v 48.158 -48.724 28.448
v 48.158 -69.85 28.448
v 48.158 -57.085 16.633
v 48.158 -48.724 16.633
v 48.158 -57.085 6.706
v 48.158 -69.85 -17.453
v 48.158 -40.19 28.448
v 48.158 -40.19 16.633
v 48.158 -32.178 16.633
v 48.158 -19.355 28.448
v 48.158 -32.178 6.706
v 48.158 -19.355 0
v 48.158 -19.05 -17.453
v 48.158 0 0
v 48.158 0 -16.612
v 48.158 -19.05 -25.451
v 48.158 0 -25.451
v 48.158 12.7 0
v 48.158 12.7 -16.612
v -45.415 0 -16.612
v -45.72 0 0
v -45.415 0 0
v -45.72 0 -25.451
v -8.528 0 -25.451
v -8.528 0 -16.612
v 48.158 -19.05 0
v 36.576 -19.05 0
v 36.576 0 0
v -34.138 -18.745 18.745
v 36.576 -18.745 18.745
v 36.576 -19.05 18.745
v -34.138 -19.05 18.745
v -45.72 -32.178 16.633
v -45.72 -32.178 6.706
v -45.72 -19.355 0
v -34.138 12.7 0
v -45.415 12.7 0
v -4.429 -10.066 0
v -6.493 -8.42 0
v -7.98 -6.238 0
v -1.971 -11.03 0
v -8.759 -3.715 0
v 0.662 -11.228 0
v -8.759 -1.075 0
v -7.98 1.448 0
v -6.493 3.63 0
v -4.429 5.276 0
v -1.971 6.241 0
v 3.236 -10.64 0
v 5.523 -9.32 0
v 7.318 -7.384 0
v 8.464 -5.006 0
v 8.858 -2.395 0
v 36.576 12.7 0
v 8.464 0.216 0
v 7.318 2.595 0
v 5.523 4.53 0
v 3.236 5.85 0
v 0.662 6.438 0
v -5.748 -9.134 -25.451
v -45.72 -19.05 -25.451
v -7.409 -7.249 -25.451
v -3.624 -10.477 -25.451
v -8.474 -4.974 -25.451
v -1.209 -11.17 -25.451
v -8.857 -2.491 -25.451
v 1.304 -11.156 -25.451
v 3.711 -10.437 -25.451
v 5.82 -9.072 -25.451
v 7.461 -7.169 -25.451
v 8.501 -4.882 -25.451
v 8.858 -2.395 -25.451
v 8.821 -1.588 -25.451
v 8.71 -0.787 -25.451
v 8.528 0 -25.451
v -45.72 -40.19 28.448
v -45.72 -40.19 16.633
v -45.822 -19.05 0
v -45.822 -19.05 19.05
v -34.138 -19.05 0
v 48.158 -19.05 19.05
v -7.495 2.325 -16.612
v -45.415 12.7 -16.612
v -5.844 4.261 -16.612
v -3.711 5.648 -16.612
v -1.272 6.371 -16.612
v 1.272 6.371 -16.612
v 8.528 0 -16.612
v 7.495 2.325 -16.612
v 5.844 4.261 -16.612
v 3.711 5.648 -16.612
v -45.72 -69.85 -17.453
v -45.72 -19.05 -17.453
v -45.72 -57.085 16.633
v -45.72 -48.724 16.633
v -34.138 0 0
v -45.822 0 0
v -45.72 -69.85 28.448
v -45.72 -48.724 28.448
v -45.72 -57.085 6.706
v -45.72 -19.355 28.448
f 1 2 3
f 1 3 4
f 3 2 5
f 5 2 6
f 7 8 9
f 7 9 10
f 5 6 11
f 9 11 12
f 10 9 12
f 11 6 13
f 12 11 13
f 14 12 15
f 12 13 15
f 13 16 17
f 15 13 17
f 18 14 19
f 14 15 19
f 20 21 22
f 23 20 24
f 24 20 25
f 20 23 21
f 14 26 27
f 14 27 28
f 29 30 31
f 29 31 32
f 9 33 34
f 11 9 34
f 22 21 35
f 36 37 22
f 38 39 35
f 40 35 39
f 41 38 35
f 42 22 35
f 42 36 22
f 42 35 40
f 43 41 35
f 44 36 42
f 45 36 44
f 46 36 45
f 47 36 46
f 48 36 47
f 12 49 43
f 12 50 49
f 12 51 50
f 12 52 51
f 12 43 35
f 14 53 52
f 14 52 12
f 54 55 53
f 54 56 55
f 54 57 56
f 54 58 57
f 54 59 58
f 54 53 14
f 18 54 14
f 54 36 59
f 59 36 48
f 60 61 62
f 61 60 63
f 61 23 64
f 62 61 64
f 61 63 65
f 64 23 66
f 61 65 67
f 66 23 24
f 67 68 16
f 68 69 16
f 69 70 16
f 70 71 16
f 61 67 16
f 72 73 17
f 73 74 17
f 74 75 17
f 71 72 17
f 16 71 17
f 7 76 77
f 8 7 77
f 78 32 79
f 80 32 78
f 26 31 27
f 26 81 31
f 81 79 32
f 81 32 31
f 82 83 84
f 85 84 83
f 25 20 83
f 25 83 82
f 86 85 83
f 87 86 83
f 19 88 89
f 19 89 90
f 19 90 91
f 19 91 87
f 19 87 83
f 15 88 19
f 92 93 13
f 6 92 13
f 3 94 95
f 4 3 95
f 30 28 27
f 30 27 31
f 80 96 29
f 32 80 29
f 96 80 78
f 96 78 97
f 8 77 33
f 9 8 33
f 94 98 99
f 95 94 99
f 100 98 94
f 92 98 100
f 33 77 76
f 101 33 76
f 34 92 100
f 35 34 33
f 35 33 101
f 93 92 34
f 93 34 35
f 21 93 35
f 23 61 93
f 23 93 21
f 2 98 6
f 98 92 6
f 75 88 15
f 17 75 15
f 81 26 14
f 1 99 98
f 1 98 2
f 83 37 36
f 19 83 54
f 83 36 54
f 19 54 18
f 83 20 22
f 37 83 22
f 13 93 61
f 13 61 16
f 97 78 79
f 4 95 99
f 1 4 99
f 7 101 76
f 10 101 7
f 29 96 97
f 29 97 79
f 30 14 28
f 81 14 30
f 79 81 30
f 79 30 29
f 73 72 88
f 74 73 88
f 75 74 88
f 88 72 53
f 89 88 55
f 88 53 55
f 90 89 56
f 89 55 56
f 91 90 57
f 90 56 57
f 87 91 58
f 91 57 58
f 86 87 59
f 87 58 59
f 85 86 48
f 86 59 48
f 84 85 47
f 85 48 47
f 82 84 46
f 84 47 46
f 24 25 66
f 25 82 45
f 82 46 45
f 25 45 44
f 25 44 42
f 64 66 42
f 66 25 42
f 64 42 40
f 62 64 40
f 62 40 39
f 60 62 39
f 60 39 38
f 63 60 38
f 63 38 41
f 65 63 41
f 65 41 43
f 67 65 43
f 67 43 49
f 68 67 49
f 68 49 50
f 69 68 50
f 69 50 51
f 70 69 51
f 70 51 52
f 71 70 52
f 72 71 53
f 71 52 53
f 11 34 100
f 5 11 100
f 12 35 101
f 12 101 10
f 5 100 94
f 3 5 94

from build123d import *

# Parameters (mm, degrees)
F0_W      = 93.8783995807
F0_H      = 25.4507996142
F1_DEPTH  = 19.05
F2_W      = 93.5736000538
F2_H      = 16.6116002947
F3_DEPTH  = 12.7
F4_W      = 93.8783995807
F4_H      = 17.4526628107
F5_DEPTH  = 50.8
F7_DEPTH  = 93.98
F8_W      = 70.7135982811
F8_H      = 18.7452007085
F9_DEPTH  = 115.824
F10_DEPTH = 152.4
F11_DEPTH = 194.818
F12_W     = 93.8783995807
F12_H     = 50.4952002376
F13_DEPTH = 28.448
F15_DEPTH = 177.8
F16_R     = 8.857520503
F17_DEPTH = 127


with BuildPart() as f1:
    # F0 (on Front) → F1 (new body)
    with BuildSketch(Plane.XZ):
        with Locations((1.2191999704, -12.7253998071)):
            Rectangle(F0_W, F0_H)
    extrude(amount=F1_DEPTH)

    # F2 (on Front) → F3 (join)
    with BuildSketch(Plane.XZ):
        with Locations((1.3715997338, -8.3058001474)):
            Rectangle(F2_W, F2_H)
    extrude(amount=-F3_DEPTH)

    # F4 (on face) → F5 (join)
    with BuildSketch(Plane.XZ.offset(19.05)):
        with Locations((1.2191999704, -8.7263314053)):
            Rectangle(F4_W, F4_H)
    extrude(amount=F5_DEPTH)

    # F8 (on face) → F10 (cut)
    with BuildSketch(Plane(origin=(0, 12.7, 0), x_dir=(-1, 0, 0), z_dir=(0, 1, 0))):
        with Locations((-1.2191999704, 9.3726003543)):
            Rectangle(F8_W, F8_H)
    extrude(amount=-F10_DEPTH, mode=Mode.SUBTRACT)

    # F8 (on face) → F11 (cut)
    with BuildSketch(Plane(origin=(0, 12.7, 0), x_dir=(-1, 0, 0), z_dir=(0, 1, 0))):
        with Locations((-1.2191999704, 9.3726003543)):
            Rectangle(F8_W, F8_H)
    extrude(amount=-F11_DEPTH, mode=Mode.SUBTRACT)

    # F12 (on face) → F13 (join)
    with BuildSketch(Plane.XY):
        with Locations((1.2191999704, -44.6023998812)):
            Rectangle(F12_W, F12_H)
    extrude(amount=F13_DEPTH)

    # F14 (on face) → F15 (cut)
    with BuildSketch(Plane(origin=(-45.71999982, 0, 0), x_dir=(0, -1, 0), z_dir=(-1, 0, 0))):
        Polygon((32.178170979, 16.6333708912), (32.178170979, 6.705599837), (57.0846870542, 6.705599837), (57.0846870542, 16.6333708912), (48.7244576216, 16.6333708912), (48.7244576216, 28.448), (40.1900559664, 28.448), (40.1900559664, 16.6333708912), align=None)
    extrude(amount=-F15_DEPTH, mode=Mode.SUBTRACT)

    # F16 (on face) → F17 (cut)
    with BuildSketch(Plane.XY):
        with Locations((0, -2.3948573507)):
            Circle(F16_R)
    extrude(amount=-F17_DEPTH, mode=Mode.SUBTRACT)


with BuildPart() as f7:
    # F6 (on face) → F7 (new body)
    with BuildSketch(Plane.YZ.offset(48.1583997607)):
        Polygon((-19.05, 19.0500002354), (-19.05, 0), (0, 0), align=None)
    extrude(amount=-F7_DEPTH)

    # F8 (on face) → F9 (cut)
    with BuildSketch(Plane(origin=(0, 12.7, 0), x_dir=(-1, 0, 0), z_dir=(0, 1, 0))):
        with Locations((-1.2191999704, 9.3726003543)):
            Rectangle(F8_W, F8_H)
    extrude(amount=-F9_DEPTH, mode=Mode.SUBTRACT)


solid = Compound([f1.part, f7.part])
